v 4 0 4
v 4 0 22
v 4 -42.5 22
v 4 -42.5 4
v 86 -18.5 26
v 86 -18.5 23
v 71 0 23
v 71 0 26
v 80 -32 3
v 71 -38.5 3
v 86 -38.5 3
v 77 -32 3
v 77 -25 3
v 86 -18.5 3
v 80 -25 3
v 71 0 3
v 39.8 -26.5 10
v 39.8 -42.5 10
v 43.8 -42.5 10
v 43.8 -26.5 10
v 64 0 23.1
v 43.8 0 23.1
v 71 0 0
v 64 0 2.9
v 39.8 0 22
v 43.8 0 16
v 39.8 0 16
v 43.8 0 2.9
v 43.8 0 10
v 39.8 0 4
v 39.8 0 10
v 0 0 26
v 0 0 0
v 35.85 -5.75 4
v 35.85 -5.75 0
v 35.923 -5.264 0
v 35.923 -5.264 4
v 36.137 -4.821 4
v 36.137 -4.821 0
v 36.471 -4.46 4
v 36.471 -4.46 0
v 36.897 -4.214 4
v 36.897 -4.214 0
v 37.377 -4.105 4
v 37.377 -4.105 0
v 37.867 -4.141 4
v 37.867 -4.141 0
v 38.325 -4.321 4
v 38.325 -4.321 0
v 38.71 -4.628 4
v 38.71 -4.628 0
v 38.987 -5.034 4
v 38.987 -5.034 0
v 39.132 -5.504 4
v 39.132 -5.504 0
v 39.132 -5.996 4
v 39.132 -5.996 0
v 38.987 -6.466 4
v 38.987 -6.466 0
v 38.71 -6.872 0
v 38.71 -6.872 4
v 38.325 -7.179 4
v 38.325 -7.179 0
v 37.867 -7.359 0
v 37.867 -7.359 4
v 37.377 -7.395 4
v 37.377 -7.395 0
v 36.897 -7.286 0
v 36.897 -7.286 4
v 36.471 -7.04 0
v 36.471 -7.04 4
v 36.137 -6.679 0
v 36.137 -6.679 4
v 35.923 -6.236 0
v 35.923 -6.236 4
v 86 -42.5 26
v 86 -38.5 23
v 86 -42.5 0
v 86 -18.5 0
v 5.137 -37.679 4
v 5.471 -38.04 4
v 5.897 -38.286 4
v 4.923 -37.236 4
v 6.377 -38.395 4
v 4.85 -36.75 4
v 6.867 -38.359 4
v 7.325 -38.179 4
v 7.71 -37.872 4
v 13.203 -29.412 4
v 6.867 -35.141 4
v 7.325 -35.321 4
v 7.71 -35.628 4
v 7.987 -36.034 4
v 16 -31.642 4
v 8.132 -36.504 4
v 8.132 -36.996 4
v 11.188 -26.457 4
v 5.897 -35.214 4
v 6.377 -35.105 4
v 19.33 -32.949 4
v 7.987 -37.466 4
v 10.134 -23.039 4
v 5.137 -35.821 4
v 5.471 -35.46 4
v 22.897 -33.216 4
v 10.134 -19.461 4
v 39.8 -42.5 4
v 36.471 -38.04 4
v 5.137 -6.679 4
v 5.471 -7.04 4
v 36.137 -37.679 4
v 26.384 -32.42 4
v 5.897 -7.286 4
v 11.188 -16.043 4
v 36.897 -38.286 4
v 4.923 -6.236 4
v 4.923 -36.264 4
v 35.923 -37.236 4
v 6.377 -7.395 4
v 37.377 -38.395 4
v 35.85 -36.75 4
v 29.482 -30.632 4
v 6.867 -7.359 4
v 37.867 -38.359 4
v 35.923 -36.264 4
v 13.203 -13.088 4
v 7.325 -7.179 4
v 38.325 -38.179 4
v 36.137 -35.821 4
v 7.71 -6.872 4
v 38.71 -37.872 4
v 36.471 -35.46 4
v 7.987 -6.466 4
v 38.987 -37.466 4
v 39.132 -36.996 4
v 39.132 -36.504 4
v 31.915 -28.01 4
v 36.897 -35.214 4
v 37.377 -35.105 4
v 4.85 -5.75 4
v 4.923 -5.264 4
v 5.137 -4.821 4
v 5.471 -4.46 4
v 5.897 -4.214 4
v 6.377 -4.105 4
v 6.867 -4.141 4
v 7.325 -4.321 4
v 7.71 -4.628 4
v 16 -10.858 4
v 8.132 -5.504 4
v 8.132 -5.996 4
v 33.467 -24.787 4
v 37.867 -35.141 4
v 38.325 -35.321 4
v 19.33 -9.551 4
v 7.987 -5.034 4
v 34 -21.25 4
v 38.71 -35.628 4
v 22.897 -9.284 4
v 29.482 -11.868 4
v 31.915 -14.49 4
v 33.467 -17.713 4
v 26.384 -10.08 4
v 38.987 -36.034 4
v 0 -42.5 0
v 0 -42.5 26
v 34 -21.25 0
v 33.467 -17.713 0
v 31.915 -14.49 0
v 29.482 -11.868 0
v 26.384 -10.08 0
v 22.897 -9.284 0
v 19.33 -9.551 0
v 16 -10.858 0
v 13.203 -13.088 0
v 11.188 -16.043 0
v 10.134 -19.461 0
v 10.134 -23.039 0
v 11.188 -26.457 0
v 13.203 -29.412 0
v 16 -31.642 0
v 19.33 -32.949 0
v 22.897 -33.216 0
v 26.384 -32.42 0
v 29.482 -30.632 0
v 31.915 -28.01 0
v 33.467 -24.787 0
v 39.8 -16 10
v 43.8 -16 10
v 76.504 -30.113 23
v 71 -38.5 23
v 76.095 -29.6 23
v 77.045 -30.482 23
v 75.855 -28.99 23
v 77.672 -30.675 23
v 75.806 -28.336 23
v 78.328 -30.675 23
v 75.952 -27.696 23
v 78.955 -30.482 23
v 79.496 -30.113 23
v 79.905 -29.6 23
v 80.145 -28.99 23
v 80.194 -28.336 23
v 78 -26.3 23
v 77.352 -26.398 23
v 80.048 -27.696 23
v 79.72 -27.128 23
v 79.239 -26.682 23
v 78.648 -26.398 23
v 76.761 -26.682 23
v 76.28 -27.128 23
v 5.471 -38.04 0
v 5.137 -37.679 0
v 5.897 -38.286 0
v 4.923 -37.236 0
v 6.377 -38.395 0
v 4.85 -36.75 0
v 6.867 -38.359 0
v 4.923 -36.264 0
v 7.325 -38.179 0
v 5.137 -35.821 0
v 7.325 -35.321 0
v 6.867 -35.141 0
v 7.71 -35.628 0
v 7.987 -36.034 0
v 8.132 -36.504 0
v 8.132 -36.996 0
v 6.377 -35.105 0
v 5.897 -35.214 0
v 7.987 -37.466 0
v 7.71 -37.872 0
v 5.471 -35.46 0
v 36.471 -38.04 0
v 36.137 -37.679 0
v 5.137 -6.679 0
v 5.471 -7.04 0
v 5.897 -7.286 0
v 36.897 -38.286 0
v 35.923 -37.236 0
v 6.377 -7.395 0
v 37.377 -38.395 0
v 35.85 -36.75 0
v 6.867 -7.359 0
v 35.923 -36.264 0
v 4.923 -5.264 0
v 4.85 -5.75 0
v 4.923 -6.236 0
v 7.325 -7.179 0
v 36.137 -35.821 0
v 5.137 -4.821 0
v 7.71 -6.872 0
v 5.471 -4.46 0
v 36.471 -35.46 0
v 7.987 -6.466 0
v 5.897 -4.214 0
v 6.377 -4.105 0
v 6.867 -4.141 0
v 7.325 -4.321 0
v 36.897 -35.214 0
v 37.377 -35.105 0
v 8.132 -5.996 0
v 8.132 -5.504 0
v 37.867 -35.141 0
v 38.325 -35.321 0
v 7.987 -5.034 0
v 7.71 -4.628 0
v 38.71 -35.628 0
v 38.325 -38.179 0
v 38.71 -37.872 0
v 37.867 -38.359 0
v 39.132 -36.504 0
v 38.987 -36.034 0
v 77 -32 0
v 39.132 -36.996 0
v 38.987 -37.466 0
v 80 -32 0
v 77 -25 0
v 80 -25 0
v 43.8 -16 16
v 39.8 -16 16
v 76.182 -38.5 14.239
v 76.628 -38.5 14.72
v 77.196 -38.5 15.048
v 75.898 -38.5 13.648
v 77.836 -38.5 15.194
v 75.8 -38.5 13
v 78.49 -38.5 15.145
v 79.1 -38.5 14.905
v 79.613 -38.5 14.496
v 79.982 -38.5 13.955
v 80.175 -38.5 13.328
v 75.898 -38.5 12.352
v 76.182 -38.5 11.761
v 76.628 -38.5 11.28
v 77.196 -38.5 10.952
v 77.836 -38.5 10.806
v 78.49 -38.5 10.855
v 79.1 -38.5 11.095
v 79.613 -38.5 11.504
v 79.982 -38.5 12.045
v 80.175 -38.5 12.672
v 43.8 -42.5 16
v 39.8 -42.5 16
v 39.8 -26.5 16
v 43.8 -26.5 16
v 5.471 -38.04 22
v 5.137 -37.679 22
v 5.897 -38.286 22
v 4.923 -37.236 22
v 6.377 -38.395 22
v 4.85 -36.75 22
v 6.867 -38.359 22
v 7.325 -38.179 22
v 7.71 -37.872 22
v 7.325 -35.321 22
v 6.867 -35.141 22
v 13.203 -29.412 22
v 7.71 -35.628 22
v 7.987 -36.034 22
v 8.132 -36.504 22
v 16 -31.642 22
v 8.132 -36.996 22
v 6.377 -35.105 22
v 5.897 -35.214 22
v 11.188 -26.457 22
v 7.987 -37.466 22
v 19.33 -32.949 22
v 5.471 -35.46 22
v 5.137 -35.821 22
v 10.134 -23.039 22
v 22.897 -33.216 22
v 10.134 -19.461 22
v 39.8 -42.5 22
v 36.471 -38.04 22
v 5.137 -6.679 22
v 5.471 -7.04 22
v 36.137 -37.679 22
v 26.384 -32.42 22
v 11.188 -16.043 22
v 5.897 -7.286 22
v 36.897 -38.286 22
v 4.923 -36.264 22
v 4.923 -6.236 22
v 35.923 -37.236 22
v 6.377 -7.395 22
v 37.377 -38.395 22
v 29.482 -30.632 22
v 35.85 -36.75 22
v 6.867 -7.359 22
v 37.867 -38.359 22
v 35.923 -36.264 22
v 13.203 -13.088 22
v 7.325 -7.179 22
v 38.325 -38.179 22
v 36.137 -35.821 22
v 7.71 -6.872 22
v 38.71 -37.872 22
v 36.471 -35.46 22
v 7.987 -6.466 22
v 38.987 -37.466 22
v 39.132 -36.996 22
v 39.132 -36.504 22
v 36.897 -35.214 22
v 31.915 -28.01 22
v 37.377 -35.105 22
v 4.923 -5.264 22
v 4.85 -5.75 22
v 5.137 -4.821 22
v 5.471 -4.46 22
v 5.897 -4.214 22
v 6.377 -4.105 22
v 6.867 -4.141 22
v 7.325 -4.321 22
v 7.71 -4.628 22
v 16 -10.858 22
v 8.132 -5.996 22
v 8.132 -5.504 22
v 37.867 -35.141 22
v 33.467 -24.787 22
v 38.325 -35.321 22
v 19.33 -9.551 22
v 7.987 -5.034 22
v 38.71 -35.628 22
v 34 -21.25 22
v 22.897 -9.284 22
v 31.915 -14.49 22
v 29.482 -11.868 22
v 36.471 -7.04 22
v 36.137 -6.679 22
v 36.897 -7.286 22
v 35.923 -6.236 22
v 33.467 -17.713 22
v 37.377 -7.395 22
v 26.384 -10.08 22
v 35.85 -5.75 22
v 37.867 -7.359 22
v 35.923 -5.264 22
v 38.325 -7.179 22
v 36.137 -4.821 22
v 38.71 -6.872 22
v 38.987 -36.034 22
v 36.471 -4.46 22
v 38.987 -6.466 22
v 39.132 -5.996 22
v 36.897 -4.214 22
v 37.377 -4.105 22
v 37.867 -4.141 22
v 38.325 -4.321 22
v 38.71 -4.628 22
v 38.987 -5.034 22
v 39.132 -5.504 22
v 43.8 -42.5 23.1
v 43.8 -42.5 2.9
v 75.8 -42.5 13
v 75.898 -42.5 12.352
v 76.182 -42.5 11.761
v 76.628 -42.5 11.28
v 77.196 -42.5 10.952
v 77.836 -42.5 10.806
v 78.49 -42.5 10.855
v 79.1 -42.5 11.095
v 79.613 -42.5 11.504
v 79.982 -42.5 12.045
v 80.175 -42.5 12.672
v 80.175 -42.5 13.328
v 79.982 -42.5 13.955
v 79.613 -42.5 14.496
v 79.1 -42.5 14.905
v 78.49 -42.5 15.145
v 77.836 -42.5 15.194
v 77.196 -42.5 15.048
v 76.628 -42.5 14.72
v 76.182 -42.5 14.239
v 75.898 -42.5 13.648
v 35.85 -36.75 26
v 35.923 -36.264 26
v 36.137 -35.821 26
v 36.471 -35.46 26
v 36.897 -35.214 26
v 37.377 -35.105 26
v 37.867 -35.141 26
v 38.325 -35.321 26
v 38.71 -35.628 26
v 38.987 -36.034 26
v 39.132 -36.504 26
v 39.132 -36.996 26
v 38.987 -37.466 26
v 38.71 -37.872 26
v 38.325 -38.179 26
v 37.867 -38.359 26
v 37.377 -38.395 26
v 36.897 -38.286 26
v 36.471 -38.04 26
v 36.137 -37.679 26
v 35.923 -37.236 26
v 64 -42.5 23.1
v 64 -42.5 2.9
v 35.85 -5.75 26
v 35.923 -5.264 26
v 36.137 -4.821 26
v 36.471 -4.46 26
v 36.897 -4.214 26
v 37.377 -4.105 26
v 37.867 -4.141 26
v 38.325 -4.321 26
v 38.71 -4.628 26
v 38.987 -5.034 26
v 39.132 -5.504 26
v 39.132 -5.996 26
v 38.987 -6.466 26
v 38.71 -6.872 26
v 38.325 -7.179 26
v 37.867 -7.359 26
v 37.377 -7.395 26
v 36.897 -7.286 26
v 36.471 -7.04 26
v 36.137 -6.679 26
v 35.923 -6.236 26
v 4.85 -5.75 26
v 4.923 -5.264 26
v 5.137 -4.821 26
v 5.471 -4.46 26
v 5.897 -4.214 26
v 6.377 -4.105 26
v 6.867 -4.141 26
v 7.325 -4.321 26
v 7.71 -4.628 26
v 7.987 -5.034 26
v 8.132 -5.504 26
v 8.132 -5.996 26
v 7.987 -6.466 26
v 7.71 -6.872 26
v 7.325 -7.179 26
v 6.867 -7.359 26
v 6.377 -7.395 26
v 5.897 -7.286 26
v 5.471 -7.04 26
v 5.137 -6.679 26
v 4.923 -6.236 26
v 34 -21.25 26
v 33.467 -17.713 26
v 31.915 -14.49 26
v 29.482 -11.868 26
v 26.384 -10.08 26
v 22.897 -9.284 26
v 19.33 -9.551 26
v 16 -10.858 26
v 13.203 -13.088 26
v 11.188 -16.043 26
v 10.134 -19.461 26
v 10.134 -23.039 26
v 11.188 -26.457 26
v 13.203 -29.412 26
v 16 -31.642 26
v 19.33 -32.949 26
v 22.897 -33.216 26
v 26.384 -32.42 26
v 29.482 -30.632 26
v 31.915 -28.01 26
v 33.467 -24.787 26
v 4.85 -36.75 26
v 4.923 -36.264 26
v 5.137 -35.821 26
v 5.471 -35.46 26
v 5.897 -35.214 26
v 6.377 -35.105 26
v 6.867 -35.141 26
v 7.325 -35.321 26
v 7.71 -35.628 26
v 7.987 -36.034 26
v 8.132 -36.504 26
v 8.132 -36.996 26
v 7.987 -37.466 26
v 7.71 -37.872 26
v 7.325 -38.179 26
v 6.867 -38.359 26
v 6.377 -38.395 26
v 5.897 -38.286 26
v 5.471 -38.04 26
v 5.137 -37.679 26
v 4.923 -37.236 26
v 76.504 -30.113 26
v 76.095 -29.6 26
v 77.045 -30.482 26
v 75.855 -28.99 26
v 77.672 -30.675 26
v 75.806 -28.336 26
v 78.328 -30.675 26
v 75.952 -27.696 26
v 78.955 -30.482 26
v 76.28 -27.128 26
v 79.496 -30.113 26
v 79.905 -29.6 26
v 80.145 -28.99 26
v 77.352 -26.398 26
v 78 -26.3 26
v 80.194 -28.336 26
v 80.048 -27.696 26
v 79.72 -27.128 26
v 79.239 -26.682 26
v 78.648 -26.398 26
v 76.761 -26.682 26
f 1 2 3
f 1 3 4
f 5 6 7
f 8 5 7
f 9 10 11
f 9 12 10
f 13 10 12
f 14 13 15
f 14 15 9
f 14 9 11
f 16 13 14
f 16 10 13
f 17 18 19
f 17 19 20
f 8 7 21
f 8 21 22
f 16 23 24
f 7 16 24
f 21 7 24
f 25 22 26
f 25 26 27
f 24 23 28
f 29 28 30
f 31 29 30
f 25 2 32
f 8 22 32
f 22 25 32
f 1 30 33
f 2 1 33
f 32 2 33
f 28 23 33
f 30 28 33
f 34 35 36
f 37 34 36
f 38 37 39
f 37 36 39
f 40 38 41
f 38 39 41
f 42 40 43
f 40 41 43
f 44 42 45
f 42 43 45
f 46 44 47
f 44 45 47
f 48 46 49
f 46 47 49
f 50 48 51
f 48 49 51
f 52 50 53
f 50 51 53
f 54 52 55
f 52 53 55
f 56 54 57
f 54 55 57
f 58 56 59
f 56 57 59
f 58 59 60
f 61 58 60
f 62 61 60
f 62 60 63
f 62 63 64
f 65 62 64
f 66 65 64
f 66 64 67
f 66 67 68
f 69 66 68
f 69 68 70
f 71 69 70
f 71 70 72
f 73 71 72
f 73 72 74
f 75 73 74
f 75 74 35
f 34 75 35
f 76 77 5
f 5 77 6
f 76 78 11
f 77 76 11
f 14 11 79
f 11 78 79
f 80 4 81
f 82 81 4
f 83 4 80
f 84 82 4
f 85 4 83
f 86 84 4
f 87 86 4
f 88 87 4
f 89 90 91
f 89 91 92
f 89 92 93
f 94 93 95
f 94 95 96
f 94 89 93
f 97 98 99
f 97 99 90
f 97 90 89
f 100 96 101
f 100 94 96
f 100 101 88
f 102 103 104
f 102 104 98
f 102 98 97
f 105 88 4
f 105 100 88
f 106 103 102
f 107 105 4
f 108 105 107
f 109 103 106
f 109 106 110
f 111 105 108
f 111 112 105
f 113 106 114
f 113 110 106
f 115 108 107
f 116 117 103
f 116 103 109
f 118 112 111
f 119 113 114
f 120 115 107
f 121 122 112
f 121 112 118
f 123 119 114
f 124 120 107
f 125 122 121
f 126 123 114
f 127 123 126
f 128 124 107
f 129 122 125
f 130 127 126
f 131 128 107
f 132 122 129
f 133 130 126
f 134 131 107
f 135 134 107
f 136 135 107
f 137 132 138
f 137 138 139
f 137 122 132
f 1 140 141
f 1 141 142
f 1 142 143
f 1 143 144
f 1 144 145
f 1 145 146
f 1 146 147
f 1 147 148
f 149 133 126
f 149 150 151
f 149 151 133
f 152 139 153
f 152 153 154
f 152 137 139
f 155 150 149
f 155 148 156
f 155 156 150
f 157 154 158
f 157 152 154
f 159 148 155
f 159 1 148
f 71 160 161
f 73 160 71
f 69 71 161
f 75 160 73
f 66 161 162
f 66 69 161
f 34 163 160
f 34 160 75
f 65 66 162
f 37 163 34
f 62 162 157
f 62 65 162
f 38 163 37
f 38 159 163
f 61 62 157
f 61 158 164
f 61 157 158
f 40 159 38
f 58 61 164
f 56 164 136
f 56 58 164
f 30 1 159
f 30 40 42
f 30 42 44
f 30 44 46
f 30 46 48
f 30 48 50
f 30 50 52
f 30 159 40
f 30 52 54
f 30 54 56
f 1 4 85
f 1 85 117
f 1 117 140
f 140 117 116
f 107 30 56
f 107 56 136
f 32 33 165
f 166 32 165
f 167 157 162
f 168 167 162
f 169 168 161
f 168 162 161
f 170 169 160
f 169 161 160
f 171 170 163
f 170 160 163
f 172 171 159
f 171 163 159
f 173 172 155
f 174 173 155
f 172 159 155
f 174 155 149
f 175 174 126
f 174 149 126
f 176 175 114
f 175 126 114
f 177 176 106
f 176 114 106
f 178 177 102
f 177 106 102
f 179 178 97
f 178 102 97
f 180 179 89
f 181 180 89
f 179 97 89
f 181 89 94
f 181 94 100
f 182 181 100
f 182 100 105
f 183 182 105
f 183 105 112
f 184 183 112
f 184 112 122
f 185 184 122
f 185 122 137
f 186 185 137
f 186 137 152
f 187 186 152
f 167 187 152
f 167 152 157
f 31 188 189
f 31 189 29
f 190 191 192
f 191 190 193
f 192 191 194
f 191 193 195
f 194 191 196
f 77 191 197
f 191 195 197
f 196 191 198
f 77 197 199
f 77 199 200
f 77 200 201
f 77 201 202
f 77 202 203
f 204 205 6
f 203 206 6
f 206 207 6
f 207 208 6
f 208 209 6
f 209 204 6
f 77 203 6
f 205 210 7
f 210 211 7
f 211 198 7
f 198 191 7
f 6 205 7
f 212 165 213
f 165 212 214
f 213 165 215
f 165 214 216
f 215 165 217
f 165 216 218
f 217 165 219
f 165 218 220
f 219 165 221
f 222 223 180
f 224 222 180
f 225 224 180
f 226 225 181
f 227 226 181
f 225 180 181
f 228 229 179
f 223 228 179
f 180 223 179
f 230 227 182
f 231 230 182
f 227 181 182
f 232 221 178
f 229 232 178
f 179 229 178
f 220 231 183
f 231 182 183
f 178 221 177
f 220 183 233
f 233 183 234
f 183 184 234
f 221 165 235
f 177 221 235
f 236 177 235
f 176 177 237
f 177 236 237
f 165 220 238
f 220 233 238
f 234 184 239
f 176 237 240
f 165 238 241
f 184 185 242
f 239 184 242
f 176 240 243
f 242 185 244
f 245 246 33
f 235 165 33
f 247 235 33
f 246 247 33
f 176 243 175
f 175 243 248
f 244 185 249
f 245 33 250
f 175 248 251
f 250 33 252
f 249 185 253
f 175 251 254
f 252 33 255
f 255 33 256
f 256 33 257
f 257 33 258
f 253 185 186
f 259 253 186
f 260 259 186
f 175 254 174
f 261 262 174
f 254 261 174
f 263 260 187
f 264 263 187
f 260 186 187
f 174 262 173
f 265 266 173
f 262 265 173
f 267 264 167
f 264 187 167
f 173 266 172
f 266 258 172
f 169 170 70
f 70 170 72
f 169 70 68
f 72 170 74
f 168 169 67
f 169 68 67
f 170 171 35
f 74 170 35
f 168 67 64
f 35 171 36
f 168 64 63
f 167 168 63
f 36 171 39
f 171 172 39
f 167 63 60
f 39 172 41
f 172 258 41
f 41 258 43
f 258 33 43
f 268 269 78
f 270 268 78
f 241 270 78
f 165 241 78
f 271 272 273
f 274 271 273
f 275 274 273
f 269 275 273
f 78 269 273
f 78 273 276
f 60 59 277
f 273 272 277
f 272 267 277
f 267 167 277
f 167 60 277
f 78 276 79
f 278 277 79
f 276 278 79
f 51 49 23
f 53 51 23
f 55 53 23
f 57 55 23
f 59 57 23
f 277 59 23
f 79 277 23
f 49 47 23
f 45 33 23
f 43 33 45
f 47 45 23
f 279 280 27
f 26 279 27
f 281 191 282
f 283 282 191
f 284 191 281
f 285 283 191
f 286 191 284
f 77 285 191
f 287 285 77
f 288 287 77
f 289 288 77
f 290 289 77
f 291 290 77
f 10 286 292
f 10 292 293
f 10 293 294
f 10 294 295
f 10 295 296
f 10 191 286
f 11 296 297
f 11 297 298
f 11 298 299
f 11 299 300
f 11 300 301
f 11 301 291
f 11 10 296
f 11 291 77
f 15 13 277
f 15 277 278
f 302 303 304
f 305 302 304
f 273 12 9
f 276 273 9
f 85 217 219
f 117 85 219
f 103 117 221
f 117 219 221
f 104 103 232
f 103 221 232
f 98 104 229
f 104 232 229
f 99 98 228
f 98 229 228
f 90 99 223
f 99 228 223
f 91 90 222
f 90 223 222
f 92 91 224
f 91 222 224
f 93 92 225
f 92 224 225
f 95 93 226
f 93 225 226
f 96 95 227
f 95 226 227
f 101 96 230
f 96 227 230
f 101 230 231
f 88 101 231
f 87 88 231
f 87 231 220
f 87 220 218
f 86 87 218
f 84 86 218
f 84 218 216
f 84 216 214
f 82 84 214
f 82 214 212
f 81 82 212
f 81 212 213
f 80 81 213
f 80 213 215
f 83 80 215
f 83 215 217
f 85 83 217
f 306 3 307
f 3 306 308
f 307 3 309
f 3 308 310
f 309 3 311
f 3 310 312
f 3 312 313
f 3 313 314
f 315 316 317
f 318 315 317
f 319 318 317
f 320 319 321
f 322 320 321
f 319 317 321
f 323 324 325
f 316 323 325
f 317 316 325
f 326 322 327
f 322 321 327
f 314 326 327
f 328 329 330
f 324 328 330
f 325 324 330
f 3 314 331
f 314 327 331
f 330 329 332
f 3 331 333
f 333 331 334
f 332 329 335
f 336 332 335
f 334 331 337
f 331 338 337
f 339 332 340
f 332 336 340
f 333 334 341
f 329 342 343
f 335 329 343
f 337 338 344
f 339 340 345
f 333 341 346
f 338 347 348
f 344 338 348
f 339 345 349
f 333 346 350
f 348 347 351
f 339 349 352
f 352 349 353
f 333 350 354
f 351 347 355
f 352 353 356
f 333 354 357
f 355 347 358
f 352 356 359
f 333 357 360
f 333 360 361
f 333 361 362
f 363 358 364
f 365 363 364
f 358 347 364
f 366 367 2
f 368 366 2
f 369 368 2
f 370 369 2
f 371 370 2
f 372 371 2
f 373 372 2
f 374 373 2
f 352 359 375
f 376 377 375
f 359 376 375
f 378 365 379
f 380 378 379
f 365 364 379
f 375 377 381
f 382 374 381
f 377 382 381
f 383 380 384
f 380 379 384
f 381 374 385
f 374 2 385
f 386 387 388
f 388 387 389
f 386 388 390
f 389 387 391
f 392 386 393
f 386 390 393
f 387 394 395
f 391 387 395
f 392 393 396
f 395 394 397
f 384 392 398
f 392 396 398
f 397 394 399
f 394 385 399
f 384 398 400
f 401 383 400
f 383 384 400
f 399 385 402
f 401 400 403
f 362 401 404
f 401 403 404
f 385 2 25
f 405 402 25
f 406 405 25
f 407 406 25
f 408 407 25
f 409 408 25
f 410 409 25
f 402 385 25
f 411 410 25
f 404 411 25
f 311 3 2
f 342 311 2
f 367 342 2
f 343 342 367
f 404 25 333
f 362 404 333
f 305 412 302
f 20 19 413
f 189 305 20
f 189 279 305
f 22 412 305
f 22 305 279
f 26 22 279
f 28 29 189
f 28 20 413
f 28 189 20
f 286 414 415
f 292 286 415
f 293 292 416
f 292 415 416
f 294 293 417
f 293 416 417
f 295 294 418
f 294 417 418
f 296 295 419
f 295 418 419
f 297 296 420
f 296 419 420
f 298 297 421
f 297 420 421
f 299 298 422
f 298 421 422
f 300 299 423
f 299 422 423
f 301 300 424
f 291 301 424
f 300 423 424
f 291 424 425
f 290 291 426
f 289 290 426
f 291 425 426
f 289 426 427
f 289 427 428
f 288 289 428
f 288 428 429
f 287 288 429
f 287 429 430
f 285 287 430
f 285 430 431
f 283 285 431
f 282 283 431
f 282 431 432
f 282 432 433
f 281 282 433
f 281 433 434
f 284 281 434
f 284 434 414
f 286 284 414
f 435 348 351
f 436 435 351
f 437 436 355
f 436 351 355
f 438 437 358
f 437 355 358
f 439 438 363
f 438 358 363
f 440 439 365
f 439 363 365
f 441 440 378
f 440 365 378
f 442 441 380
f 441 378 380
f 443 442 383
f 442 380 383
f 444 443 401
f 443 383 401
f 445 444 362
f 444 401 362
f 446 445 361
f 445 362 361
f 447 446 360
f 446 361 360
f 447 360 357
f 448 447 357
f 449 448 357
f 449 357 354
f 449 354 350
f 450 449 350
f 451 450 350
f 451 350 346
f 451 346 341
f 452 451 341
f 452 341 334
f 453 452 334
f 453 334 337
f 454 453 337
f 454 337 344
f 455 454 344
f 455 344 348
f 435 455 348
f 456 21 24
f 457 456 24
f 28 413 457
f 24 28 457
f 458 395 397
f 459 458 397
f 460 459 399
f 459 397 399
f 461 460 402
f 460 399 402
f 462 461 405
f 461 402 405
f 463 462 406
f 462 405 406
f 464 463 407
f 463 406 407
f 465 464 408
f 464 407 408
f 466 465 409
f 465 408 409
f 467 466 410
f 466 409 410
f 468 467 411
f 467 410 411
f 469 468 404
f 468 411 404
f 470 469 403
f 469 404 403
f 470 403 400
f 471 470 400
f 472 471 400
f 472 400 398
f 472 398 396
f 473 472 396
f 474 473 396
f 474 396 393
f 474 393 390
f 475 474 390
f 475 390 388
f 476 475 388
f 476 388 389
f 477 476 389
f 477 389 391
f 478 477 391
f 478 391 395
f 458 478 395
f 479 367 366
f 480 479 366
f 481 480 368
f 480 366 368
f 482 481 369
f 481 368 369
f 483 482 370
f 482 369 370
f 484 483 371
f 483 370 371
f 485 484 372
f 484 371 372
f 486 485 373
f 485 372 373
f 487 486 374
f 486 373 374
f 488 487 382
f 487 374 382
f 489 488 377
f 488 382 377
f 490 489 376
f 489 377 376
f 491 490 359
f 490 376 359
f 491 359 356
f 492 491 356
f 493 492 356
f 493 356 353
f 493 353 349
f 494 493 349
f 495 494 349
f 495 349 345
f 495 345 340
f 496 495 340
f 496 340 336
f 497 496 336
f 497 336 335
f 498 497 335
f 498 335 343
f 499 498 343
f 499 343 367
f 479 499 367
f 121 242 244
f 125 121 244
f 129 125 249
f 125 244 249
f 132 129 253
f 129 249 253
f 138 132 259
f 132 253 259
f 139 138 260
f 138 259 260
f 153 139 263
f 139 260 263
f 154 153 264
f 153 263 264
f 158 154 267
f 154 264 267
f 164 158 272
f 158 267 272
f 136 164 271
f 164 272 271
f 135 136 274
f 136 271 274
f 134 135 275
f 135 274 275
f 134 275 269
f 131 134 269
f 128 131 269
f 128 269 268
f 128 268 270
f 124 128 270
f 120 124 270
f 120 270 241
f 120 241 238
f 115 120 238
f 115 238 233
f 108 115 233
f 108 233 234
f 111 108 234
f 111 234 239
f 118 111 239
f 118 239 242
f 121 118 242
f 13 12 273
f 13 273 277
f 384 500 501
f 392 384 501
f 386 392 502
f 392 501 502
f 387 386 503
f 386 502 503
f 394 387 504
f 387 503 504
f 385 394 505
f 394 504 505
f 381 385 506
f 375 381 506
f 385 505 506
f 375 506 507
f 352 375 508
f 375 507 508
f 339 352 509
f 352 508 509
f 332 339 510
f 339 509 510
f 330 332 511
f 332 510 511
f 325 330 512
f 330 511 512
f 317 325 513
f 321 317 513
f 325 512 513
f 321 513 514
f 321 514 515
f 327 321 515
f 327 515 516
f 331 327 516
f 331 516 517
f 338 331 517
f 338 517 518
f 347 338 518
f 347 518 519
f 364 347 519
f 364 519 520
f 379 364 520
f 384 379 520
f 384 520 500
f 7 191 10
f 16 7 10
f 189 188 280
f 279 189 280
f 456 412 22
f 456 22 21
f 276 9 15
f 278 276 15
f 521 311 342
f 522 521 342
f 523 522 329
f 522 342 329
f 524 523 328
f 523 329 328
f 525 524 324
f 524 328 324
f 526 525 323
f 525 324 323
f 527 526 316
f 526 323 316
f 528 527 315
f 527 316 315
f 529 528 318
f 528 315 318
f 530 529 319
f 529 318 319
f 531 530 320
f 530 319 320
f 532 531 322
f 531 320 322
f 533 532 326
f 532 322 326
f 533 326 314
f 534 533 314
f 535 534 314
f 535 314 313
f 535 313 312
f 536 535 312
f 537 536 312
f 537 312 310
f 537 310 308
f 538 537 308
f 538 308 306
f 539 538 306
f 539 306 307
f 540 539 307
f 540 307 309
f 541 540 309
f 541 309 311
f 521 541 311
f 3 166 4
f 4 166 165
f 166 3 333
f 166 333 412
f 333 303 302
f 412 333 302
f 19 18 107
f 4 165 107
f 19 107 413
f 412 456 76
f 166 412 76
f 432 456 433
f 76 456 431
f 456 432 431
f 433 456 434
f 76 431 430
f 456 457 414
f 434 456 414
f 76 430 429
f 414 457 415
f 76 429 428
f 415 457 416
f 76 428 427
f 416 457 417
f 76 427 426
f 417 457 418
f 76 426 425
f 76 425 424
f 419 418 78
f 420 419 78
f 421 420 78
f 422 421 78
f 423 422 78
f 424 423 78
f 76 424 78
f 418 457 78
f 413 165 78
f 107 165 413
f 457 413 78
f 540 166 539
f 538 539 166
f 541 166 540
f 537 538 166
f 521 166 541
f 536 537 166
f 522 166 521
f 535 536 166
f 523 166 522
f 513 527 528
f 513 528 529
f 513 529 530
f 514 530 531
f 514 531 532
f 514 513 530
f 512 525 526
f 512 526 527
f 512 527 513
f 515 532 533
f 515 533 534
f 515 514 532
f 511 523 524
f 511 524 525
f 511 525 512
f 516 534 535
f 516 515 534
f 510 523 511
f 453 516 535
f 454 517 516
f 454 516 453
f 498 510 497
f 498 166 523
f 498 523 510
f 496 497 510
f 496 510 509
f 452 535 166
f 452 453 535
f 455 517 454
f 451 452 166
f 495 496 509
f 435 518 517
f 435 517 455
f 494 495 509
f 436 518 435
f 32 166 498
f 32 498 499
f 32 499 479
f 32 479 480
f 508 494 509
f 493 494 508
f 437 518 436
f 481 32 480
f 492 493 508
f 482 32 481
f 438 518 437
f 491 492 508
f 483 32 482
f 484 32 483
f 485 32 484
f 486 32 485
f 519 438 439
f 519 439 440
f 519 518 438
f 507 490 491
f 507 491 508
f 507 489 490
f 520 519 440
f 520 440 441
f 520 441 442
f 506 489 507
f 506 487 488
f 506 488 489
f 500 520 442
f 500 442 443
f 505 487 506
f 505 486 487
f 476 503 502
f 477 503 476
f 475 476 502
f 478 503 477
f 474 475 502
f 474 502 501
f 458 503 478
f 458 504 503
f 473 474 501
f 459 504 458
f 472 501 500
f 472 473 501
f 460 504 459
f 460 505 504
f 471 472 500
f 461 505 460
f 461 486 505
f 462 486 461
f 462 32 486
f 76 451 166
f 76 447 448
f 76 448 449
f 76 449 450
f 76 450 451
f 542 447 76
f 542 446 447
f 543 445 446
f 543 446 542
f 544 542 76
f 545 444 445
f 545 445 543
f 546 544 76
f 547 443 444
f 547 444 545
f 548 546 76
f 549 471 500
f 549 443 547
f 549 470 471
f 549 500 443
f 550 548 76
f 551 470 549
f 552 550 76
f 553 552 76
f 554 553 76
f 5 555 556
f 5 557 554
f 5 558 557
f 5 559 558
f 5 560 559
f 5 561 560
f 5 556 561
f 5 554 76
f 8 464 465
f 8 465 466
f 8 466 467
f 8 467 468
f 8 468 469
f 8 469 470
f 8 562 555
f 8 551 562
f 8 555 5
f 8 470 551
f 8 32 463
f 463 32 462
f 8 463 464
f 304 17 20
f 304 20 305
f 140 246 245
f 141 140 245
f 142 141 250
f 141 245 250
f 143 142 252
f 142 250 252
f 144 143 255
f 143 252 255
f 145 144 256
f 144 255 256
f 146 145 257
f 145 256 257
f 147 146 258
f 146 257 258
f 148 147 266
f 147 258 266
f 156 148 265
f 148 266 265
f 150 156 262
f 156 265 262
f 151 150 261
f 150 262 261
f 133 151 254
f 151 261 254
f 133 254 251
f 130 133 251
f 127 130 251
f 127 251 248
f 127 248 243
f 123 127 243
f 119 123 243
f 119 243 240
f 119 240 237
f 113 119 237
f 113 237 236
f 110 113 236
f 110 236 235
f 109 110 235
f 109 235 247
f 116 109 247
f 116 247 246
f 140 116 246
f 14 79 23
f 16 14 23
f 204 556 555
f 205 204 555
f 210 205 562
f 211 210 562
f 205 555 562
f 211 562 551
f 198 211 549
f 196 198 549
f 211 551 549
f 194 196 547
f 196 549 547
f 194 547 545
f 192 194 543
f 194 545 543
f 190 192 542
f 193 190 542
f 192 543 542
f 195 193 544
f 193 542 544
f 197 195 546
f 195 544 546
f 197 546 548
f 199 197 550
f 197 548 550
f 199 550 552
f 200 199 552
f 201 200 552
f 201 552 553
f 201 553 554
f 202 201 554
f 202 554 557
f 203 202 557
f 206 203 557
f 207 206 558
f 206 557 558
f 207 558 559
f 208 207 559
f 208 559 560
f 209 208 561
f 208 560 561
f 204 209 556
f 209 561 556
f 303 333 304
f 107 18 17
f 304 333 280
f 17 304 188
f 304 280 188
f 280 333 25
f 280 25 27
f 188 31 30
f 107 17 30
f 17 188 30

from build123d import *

# Parameters (mm, degrees)
BOSS_EXTRU_1_DEPTH      = 26
ESQUISSE2_R             = 12
ENL_V_MAT_EXTRU_1_DEPTH = 27
ESQUISSE3_W             = 35.8
ESQUISSE3_H             = 18
ESQUISSE3_W_2           = 20.2
ESQUISSE3_H_2           = 20.2
ENL_V_MAT_EXTRU_2_DEPTH = 43.5
ESQUISSE4_W             = 15
ESQUISSE4_H             = 20
ENL_V_MAT_EXTRU_3_DEPTH = 38.5
D_GAGEMENT_M31_D        = 3.3
ENL_V_MAT_EXTRU_4_REACH = 48.2
ESQUISSE7_W             = 6
ESQUISSE7_H             = 16
D_GAGEMENT_M41_D        = 4.4
D_GAGEMENT_M41_DEPTH    = 24
ESQUISSE10_W            = 2.2
ESQUISSE10_H            = 24
ENL_V_MAT_EXTRU_5_REACH = 5
ESQUISSE12_W            = 3
ESQUISSE12_H            = 7


with BuildPart() as part:
    # Esquisse1 → Boss.-Extru.1 (new body)
    with BuildSketch(Plane.XY):
        Polygon((0, 0), (0, -42.5), (86, -42.5), (86, -18.5), (71, 0), align=None)
    extrude(amount=BOSS_EXTRU_1_DEPTH)

    # Esquisse2 → Enlèv. mat.-Extru.1 (cut, through all)
    with BuildSketch(Plane.XY.offset(26)):
        with Locations((22, -21.25)):
            Circle(ESQUISSE2_R)
    extrude(amount=-ENL_V_MAT_EXTRU_1_DEPTH, mode=Mode.SUBTRACT)

    # Esquisse3 → Enlèv. mat.-Extru.2 (cut, through all)
    with BuildSketch(Plane(origin=(0, 0, 0), x_dir=(1, 0, 0), z_dir=(0, 1, 0))):
        with Locations((21.9, -13)):
            Rectangle(ESQUISSE3_W, ESQUISSE3_H)
        with Locations((53.9, -13)):
            Rectangle(ESQUISSE3_W_2, ESQUISSE3_H_2)
    extrude(amount=-ENL_V_MAT_EXTRU_2_DEPTH, mode=Mode.SUBTRACT)

    # Esquisse4 → Enlèv. mat.-Extru.3 (cut)
    with BuildSketch(Plane(origin=(0, 0, 0), x_dir=(1, 0, 0), z_dir=(0, 1, 0))):
        with Locations((78.5, -13)):
            Rectangle(ESQUISSE4_W, ESQUISSE4_H)
    extrude(amount=-ENL_V_MAT_EXTRU_3_DEPTH, mode=Mode.SUBTRACT)

    # Dégagement M31 (through all)
    with Locations(Plane.XY.offset(26)):
        with Locations((22, -21.25), (37.5, -36.75), (6.5, -5.75), (6.5, -36.75), (37.5, -5.75)):
            Hole(D_GAGEMENT_M31_D / 2)

    # Esquisse7 → Enlèv. mat.-Extru.4 (cut, up to next)
    with BuildSketch(Plane.ZY.offset(-39.8), mode=Mode.PRIVATE) as enl_v_mat_extru_4_sk1:
        with Locations((13, -8)):
            Rectangle(ESQUISSE7_W, ESQUISSE7_H)
    enl_v_mat_extru_4_tool1 = extrude(enl_v_mat_extru_4_sk1.sketch, amount=-ENL_V_MAT_EXTRU_4_REACH, mode=Mode.PRIVATE) & part.part
    add(enl_v_mat_extru_4_tool1.solids().sort_by_distance((39.8, -8, 13))[0], mode=Mode.SUBTRACT)
    # Esquisse7 → Enlèv. mat.-Extru.4 (cut, up to next)
    with BuildSketch(Plane.ZY.offset(-39.8), mode=Mode.PRIVATE) as enl_v_mat_extru_4_sk2:
        with Locations((13, -34.5)):
            Rectangle(ESQUISSE7_W, ESQUISSE7_H)
    enl_v_mat_extru_4_tool2 = extrude(enl_v_mat_extru_4_sk2.sketch, amount=-ENL_V_MAT_EXTRU_4_REACH, mode=Mode.PRIVATE) & part.part
    add(enl_v_mat_extru_4_tool2.solids().sort_by_distance((39.8, -34.5, 13))[0], mode=Mode.SUBTRACT)

    # Dégagement M41
    with Locations(Plane(origin=(0, -38.5, 0), x_dir=(1, 0, 0), z_dir=(0, 1, 0))):
        with Locations((78, -13)):
            Hole(D_GAGEMENT_M41_D / 2, depth=D_GAGEMENT_M41_DEPTH)

    # Esquisse10 → Dégagement M42 (revolve, cut)
    with BuildSketch(Plane(origin=(78, -28.5, 23), x_dir=(0, 1, 0), z_dir=(1, 0, 0))):
        with Locations((1.1, 12)):
            Rectangle(ESQUISSE10_W, ESQUISSE10_H)
    revolve(axis=Axis((78, -28.5, 16.65), (0, 0, 1)), mode=Mode.SUBTRACT)

    # Esquisse12 → Enlèv. mat.-Extru.5 (cut, up to next)
    with BuildSketch(Plane.XY.offset(3), mode=Mode.PRIVATE) as enl_v_mat_extru_5_sk1:
        with Locations((78.5, -28.5)):
            Rectangle(ESQUISSE12_W, ESQUISSE12_H)
    enl_v_mat_extru_5_tool1 = extrude(enl_v_mat_extru_5_sk1.sketch, amount=-ENL_V_MAT_EXTRU_5_REACH, mode=Mode.PRIVATE) & part.part
    add(enl_v_mat_extru_5_tool1.solids().sort_by_distance((78.5, -28.5, 3))[0], mode=Mode.SUBTRACT)


solid = part.part
